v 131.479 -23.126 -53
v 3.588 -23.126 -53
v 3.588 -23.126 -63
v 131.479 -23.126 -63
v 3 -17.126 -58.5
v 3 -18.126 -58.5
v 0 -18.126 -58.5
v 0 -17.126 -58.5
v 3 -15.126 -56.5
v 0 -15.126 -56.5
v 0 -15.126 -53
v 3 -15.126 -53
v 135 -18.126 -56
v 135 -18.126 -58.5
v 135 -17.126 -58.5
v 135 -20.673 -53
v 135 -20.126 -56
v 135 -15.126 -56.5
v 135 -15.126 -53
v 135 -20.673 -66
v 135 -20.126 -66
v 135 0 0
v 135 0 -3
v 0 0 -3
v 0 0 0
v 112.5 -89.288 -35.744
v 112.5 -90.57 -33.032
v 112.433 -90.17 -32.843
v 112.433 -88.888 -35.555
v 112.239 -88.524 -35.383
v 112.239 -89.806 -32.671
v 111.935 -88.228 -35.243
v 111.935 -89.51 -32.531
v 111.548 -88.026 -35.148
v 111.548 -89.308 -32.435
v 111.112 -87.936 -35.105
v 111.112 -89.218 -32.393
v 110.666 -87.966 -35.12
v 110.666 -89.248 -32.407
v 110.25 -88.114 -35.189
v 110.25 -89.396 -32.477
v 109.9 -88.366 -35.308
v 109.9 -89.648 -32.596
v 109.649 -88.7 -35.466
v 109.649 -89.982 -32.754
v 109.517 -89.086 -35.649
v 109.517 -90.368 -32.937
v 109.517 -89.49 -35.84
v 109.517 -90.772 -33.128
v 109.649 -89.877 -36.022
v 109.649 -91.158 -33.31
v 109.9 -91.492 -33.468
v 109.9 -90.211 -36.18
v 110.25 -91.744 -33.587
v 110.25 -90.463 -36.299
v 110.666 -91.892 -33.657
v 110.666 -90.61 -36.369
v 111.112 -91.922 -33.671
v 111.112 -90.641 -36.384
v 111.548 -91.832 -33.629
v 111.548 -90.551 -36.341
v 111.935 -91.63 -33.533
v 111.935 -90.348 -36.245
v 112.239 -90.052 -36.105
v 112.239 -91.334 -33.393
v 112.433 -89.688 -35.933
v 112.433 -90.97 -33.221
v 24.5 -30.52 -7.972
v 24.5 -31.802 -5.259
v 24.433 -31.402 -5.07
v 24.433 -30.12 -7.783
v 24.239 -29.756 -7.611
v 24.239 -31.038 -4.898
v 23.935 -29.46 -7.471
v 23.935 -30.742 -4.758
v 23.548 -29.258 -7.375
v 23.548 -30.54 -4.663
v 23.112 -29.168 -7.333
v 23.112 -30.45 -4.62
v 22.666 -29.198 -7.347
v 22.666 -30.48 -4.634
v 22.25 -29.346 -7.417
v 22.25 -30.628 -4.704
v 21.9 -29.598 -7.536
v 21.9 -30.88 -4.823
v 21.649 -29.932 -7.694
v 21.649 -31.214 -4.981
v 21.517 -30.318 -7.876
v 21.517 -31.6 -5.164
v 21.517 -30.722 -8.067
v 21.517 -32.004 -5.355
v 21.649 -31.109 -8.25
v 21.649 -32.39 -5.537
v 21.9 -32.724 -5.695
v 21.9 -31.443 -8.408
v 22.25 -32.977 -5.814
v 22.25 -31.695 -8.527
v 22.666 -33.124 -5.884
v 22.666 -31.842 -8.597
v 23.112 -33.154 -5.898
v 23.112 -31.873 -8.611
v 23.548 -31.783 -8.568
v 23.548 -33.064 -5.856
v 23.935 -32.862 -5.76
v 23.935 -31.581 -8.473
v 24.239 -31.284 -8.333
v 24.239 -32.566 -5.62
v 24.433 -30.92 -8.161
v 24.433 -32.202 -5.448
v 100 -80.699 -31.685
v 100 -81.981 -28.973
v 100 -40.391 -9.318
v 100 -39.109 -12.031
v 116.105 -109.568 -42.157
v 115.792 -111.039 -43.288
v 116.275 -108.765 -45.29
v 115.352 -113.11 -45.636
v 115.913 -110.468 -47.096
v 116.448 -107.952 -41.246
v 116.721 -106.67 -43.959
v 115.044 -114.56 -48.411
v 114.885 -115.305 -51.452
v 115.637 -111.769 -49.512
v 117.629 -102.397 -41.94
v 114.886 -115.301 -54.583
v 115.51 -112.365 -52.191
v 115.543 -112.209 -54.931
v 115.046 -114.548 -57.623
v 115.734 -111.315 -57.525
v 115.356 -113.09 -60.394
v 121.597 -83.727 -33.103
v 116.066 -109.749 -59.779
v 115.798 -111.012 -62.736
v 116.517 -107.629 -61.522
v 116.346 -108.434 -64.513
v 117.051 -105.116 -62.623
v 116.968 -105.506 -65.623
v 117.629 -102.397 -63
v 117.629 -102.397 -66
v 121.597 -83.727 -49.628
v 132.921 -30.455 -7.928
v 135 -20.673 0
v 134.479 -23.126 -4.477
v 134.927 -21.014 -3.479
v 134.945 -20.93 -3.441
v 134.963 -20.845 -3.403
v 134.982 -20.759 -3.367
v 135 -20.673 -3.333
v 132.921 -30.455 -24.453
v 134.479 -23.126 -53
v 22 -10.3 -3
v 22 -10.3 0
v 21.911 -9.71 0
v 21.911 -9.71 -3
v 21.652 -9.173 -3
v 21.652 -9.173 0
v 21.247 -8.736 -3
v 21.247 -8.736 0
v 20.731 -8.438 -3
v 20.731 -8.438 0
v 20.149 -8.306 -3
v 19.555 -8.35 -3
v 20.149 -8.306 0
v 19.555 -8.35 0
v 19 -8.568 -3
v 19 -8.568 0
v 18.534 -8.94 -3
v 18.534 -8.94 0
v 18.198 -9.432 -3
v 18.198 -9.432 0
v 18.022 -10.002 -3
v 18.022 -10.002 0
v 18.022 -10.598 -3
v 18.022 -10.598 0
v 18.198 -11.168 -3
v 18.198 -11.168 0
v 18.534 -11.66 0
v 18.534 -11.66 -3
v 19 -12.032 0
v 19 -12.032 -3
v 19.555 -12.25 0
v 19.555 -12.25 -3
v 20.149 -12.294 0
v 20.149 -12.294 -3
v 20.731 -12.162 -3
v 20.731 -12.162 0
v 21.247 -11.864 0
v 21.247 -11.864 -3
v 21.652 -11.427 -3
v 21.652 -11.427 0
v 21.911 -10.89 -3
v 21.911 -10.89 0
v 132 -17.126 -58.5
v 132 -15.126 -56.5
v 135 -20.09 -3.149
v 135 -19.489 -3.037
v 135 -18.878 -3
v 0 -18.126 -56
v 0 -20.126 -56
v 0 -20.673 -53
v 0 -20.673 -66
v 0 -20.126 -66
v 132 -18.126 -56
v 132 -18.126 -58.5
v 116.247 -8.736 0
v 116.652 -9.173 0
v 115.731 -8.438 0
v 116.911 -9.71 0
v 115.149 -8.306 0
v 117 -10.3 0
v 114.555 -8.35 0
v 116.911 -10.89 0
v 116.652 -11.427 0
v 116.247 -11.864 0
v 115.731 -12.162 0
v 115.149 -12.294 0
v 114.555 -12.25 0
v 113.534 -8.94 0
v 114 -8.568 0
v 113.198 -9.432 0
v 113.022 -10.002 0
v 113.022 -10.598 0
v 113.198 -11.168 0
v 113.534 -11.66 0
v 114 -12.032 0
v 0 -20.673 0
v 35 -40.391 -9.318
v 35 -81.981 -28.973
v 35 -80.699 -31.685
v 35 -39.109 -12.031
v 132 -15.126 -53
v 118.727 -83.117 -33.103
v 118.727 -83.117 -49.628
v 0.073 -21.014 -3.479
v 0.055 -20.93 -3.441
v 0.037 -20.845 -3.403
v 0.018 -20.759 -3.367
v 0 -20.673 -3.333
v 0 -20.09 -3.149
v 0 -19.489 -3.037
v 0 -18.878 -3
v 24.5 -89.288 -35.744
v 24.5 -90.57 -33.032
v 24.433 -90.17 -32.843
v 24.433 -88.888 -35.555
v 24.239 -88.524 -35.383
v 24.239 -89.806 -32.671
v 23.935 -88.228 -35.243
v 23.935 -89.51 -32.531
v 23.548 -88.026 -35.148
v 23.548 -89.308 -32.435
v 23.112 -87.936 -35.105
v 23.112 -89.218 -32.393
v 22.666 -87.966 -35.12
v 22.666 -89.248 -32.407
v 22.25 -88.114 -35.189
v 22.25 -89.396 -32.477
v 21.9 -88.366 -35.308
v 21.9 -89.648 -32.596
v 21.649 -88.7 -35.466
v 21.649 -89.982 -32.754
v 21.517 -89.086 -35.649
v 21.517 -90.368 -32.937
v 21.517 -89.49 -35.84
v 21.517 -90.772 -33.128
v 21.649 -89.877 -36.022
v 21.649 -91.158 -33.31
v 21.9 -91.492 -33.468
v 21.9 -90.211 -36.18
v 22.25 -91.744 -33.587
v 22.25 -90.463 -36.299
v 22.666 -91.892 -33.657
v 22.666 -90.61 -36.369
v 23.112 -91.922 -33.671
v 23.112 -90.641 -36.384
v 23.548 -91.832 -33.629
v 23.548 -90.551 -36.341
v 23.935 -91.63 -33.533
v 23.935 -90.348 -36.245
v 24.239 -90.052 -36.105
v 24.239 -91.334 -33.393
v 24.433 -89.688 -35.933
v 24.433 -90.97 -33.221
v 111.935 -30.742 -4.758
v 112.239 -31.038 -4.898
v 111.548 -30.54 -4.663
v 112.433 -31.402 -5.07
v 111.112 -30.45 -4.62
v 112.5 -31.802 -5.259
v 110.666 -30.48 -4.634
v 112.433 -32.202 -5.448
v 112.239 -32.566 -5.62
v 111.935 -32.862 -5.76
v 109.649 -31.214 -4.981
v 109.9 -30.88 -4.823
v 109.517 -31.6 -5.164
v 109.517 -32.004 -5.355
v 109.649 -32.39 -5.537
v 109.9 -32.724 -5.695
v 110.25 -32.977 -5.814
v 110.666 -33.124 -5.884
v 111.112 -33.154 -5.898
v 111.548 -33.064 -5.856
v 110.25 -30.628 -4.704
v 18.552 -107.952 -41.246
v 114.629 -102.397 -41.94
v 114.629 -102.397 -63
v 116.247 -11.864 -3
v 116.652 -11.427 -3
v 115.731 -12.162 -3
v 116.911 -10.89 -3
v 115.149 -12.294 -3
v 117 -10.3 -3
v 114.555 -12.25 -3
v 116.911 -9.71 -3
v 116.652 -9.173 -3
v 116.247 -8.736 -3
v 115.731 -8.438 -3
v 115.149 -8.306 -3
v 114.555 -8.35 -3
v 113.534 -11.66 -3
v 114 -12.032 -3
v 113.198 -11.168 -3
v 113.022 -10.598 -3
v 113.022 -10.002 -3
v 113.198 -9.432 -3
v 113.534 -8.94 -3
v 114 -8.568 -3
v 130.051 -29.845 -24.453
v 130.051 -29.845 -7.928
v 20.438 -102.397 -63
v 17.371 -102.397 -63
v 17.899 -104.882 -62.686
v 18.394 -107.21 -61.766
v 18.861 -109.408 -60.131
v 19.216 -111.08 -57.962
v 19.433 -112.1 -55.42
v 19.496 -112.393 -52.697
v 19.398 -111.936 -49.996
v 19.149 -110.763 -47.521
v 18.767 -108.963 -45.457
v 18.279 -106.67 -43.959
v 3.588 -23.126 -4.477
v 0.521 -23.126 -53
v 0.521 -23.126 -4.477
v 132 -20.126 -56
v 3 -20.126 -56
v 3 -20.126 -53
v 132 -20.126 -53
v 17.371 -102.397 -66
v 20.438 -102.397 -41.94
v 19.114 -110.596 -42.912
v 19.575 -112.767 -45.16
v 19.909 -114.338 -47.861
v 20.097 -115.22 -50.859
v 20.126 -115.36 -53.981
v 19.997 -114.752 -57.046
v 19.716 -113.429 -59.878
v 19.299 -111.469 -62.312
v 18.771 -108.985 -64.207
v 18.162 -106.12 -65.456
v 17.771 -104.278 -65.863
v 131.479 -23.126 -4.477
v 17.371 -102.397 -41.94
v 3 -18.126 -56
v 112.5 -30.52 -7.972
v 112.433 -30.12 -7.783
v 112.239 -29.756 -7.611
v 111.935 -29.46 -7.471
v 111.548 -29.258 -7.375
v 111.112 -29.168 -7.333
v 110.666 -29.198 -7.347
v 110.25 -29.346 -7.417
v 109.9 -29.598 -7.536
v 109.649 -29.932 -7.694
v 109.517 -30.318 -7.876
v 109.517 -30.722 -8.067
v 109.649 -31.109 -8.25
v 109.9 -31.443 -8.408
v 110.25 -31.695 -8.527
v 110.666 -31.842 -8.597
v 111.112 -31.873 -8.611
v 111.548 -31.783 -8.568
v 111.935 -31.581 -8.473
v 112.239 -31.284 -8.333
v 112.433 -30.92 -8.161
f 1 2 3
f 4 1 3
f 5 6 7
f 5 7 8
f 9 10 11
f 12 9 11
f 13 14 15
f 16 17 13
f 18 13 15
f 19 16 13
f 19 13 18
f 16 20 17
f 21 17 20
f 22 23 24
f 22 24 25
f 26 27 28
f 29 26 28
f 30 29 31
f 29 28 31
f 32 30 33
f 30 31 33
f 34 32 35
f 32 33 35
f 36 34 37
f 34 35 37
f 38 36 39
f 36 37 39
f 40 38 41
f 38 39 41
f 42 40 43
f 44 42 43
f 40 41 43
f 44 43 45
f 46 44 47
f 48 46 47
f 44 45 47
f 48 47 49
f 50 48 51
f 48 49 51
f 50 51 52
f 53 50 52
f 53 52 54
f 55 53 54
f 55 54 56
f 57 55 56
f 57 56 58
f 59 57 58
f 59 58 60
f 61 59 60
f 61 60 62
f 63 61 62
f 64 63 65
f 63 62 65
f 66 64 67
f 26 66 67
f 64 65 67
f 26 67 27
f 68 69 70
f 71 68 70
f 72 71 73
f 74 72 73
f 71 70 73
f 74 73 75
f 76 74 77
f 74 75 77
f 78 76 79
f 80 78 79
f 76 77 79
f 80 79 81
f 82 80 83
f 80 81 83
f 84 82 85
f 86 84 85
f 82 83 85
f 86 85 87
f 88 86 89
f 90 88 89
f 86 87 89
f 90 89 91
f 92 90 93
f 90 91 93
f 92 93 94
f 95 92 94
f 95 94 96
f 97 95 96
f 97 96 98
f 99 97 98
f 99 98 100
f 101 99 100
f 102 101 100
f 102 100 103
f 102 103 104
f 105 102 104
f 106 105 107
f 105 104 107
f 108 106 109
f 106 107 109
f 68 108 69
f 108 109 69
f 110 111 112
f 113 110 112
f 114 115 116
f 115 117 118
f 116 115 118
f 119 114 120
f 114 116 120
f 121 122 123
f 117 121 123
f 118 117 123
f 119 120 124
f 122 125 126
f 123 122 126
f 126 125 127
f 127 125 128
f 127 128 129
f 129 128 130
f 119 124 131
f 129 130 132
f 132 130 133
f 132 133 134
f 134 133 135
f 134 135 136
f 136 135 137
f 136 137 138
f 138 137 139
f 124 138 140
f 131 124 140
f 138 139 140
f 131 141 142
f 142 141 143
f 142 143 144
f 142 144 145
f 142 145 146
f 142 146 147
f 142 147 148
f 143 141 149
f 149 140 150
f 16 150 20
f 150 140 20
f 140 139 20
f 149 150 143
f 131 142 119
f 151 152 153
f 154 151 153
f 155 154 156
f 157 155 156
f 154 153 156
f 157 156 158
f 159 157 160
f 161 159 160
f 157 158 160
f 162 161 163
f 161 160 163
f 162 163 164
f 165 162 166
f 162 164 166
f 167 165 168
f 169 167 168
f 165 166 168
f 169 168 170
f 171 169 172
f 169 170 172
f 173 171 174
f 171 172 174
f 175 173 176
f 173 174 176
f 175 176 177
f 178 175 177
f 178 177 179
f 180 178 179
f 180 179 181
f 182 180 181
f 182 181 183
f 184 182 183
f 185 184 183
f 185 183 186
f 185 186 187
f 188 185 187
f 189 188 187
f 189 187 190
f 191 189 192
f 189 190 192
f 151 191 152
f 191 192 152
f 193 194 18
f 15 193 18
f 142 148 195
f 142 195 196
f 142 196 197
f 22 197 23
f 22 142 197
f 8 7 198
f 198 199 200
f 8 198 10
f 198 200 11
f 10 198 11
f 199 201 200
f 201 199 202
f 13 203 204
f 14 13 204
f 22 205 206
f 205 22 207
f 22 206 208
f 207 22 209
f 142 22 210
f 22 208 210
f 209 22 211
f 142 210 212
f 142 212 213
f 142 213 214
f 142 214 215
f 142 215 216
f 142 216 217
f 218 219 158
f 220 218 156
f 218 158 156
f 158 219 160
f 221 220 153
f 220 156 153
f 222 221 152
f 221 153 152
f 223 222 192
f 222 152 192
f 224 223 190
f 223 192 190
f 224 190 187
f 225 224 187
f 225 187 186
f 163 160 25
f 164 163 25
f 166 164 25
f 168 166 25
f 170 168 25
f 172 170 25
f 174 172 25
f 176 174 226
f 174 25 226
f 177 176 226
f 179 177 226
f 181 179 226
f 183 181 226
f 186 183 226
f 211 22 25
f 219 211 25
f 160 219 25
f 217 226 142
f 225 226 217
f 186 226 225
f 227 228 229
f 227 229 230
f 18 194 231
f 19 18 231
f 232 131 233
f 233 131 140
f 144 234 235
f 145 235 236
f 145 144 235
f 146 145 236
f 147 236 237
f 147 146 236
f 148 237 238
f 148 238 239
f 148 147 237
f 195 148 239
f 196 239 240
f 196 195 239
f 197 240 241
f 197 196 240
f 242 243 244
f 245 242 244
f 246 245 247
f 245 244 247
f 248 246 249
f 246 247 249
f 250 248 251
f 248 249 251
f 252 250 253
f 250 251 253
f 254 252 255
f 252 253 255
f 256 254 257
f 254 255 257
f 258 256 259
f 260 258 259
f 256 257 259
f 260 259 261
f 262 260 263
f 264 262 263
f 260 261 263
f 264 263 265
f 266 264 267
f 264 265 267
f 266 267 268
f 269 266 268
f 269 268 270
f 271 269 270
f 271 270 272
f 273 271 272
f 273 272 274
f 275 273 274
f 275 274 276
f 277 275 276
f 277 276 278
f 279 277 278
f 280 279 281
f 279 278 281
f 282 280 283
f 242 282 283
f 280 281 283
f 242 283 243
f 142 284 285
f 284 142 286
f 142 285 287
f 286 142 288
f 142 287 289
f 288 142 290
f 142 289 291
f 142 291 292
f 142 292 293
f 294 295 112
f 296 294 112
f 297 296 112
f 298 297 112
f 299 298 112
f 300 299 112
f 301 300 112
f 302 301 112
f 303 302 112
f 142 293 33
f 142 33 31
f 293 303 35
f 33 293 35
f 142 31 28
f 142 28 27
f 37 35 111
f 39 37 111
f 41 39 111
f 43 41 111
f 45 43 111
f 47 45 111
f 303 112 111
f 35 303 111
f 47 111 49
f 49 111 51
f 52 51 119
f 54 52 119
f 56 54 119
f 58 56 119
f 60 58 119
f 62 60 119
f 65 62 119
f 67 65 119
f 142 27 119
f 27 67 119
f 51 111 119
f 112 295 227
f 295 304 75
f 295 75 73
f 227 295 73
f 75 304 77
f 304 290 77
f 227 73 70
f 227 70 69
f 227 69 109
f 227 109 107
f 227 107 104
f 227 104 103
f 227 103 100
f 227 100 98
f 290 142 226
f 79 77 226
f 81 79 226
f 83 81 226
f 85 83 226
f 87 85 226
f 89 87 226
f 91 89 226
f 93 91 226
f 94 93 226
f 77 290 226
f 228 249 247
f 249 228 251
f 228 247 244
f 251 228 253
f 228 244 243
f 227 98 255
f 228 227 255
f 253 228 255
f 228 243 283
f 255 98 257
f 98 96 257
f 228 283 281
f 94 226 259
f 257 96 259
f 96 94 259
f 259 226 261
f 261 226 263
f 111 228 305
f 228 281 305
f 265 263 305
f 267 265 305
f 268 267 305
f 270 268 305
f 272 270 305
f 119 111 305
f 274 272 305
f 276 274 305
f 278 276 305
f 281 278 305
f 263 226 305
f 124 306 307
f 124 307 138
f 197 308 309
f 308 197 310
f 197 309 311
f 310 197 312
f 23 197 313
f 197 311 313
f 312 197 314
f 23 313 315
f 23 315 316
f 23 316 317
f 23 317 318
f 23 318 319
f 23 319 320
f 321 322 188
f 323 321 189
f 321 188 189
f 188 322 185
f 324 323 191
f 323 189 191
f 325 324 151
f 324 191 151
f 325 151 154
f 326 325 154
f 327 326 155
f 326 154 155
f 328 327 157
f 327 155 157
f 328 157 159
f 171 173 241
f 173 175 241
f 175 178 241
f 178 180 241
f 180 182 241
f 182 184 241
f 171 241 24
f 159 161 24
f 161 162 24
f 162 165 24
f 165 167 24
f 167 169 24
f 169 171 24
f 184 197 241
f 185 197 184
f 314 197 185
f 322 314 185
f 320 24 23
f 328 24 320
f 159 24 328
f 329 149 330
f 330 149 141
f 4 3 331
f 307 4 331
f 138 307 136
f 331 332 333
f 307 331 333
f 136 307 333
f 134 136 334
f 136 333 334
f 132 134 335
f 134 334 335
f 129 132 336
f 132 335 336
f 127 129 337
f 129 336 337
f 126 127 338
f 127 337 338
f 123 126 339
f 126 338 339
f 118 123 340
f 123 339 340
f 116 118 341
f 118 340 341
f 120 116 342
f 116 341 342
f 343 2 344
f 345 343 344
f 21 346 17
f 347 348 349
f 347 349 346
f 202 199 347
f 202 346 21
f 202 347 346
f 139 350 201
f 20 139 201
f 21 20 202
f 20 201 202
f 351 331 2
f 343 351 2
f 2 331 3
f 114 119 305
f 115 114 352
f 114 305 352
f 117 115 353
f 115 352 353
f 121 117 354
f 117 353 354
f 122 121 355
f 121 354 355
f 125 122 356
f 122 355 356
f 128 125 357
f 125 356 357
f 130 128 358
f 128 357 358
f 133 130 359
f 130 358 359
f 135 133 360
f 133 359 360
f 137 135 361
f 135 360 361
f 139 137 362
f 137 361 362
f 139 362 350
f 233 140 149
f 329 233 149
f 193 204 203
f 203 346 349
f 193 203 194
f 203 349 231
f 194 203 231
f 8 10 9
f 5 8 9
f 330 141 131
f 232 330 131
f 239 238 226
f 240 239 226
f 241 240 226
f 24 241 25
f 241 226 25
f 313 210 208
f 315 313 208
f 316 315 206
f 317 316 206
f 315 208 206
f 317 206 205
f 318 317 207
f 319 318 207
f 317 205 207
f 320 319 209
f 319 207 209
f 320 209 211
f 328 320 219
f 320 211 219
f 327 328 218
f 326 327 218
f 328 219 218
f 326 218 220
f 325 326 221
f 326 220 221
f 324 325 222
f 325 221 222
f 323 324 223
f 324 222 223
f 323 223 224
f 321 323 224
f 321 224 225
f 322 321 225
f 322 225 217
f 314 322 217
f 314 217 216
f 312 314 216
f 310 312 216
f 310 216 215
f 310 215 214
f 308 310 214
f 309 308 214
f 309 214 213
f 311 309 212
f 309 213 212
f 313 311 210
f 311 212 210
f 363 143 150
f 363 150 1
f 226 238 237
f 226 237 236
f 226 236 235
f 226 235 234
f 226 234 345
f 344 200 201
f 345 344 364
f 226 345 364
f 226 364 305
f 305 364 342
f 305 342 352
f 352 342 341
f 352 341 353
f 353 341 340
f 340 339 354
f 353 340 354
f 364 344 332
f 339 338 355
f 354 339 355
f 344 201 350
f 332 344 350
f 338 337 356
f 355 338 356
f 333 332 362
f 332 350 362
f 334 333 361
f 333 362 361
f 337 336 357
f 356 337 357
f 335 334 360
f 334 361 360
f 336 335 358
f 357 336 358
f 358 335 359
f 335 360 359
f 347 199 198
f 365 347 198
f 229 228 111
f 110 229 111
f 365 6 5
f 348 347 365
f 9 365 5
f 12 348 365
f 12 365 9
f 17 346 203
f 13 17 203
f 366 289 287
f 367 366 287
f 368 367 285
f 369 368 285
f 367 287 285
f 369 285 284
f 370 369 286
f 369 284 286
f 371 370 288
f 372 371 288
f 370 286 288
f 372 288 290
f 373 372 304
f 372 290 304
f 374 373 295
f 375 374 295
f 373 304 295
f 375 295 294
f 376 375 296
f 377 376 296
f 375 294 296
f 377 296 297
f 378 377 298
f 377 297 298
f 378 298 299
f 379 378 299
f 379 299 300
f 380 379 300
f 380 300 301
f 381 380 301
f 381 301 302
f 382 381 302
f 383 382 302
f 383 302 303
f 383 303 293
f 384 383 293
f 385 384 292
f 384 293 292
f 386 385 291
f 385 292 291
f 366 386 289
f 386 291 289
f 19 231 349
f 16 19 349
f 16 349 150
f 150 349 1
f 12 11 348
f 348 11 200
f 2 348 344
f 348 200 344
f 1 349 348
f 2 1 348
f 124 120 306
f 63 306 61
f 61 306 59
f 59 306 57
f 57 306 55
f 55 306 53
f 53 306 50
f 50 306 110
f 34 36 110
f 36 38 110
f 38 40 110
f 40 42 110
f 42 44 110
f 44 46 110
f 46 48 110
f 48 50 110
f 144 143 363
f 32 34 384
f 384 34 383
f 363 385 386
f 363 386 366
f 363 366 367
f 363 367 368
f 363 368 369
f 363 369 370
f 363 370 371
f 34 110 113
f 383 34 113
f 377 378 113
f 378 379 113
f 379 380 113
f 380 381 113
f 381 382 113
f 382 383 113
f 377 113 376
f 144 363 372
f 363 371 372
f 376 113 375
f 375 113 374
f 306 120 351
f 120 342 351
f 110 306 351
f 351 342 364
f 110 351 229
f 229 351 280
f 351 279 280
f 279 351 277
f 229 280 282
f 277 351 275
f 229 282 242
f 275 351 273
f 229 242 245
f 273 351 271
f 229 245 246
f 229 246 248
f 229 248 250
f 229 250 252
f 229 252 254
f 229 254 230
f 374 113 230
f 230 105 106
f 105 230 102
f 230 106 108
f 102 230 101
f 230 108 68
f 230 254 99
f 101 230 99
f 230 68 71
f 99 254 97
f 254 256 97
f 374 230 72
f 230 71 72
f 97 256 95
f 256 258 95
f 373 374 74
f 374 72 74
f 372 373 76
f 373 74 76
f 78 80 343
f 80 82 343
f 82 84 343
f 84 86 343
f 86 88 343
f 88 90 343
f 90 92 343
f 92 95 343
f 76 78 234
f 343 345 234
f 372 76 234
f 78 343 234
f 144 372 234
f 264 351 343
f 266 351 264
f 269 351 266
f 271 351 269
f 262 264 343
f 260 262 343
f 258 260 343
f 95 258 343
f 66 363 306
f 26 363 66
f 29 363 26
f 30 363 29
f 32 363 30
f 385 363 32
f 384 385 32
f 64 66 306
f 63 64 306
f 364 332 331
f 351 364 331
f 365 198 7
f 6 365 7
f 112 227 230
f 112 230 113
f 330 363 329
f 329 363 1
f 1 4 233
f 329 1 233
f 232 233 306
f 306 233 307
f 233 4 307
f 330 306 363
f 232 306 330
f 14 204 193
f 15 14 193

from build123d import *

# Parameters (mm, degrees)
F1_DEPTH       = 135
F2_R           = 1.5
F2_W           = 65
F2_H           = 46
F3_DEPTH       = 3
F4_R           = 2
F5_DEPTH       = 3
F6_SIZE        = 2
F7_R           = 5
F10_DEPTH      = 116
F15_DEPTH      = 64.5
F15_DEPTH_BACK = 64.5
F17_REACH      = 144.7359325659
F19_DEPTH      = 2.9344428022


# Not quite as in the source:
# - a feature names something its author has since deleted; it is built from what else it names


with BuildPart() as f1:
    # F0 (on Right) → F1 (new body)
    with BuildSketch(Plane.YZ):
        with BuildLine():
            Line((-106.670074853, -43.9587721159), (-20, -3))
            Line((-20, -3), (0, -3))
            Line((0, -3), (0, 0))
            Line((0, 0), (-20.6731804218, 0))
            Line((-20.6731804218, 0), (-107.9518930349, -41.2464037506))
            ThreePointArc((-107.9518930349, -41.2464037506), (-115.0819199271, -55.8463352542), (-102.3973475803, -66))
            Line((-102.3973475803, -66), (-20.1261255298, -66))
            Line((-20.1261255298, -66), (-20.1261255298, -56))
            Line((-20.1261255298, -56), (-18.1261255298, -56))
            Line((-18.1261255298, -56), (-18.1261255298, -58.5))
            Line((-18.1261255298, -58.5), (-15.1261255298, -58.5))
            Line((-15.1261255298, -58.5), (-15.1261255298, -53))
            Line((-15.1261255298, -53), (-23.1261255298, -53))
            Line((-23.1261255298, -53), (-23.1261255298, -63))
            Line((-23.1261255298, -63), (-102.3973475803, -63))
            ThreePointArc((-102.3973475803, -63), (-112.154710924, -55.189488657), (-106.670074853, -43.9587721159))
        make_face()
    extrude(amount=F1_DEPTH)

    # F2 (on face) → F3 (cut, through all)
    with BuildSketch(Plane(origin=(0, -3.7741368225, 7.9861945076), x_dir=(1, 0, 0), z_dir=(0, -0.4272727273, 0.9041227884))):
        with Locations((23, -31.0000917132)):
            Circle(F2_R)
        with Locations((111, -31.0000917132)):
            Circle(F2_R)
        with Locations((111, -96.0000917132)):
            Circle(F2_R)
        with Locations((23, -96.0000917132)):
            Circle(F2_R)
        with Locations((67.5, -63.5000917132)):
            Rectangle(F2_W, F2_H)
    extrude(amount=-F3_DEPTH, mode=Mode.SUBTRACT)

    # F4 (on face) → F5 (cut, through all)
    with BuildSketch(Plane.XY):
        with Locations((20, -10.3)):
            Circle(F4_R)
        with Locations((115, -10.3)):
            Circle(F4_R)
    extrude(amount=-F5_DEPTH, mode=Mode.SUBTRACT)

    # F6
    f6_edges = [f1.edges().sort_by_distance(p)[0] for p in [
        (67.5, -15.126126, -58.5),
    ]]
    chamfer(f6_edges, length=F6_SIZE)

    # F7
    f7_edges = [f1.edges().sort_by_distance(p)[0] for p in [
        (67.5, -20, -3),
    ]]
    fillet(f7_edges, radius=F7_R)

    # F9 (on offset) → F10 (cut, through all)
    with BuildSketch(Plane.XY.offset(50)):
        Polygon((26.5695702088, -145.6731804218), (0, -20.6731804218), (0, -145.6731804218), align=None)
        Polygon((135, -145.6731804218), (135, -20.6731804218), (108.4304297912, -145.6731804218), align=None)
    extrude(amount=-F10_DEPTH, mode=Mode.SUBTRACT)

    # F11 (on face) → F12 (join, up to the next surface of F1)
    with BuildSketch(Plane.XY.offset(-63)):
        Polygon((114.6289920234, -102.3973475803), (117.6289920234, -102.3973475803), (134.4786104219, -23.1261255298), (131.4786104219, -23.1261255298), align=None)
    extrude(until=Until.NEXT)

    # F14 (on offset) → F15 (cut, two sides)
    with BuildSketch(Plane.YZ.offset(67.5)) as f15_sk:
        Polygon((-15.1261255298, -53), (-20.1261255298, -53), (-20.1261255298, -56), (-18.1261255298, -56), (-18.1261255298, -58.5), (-17.1261255298, -58.5), (-15.1261255298, -56.5), align=None)
    extrude(amount=-F15_DEPTH, mode=Mode.SUBTRACT)
    extrude(f15_sk.sketch, amount=F15_DEPTH_BACK, mode=Mode.SUBTRACT)

    f17_end = f1.faces().sort_by_distance((10.9056419214, -64.0293542161, -20.4893747382))[0]
    # F16 (on face) → F17 (join, up to a face of the model that its end follows)
    with BuildSketch(Plane.XY.offset(-63)):
        Polygon((0.5213895781, -23.1261255298), (17.3710079766, -102.3973475803), (20.4380297612, -102.3973475803), (3.5884113627, -23.1261255298), align=None)
    f17_long = extrude(amount=F17_REACH, mode=Mode.PRIVATE)
    add(split(f17_long, bisect_by=f17_end, keep=Keep.BOTTOM, mode=Mode.PRIVATE))

    # F18 (on face) → F19 (cut, through all)
    with BuildSketch(Plane(origin=(133.3685883941, -28.3483685838, 0), x_dir=(0.2079116908, 0.9781476007, 0), z_dir=(0.9781476007, -0.2079116908, 0))):
        Polygon((-2.1533435687, -7.9275703375), (-56.6160369654, -33.1032536049), (-56.6160369654, -49.6283268957), (-2.1533435687, -24.4526436284), align=None)
    extrude(amount=-F19_DEPTH, mode=Mode.SUBTRACT)


solid = f1.part
